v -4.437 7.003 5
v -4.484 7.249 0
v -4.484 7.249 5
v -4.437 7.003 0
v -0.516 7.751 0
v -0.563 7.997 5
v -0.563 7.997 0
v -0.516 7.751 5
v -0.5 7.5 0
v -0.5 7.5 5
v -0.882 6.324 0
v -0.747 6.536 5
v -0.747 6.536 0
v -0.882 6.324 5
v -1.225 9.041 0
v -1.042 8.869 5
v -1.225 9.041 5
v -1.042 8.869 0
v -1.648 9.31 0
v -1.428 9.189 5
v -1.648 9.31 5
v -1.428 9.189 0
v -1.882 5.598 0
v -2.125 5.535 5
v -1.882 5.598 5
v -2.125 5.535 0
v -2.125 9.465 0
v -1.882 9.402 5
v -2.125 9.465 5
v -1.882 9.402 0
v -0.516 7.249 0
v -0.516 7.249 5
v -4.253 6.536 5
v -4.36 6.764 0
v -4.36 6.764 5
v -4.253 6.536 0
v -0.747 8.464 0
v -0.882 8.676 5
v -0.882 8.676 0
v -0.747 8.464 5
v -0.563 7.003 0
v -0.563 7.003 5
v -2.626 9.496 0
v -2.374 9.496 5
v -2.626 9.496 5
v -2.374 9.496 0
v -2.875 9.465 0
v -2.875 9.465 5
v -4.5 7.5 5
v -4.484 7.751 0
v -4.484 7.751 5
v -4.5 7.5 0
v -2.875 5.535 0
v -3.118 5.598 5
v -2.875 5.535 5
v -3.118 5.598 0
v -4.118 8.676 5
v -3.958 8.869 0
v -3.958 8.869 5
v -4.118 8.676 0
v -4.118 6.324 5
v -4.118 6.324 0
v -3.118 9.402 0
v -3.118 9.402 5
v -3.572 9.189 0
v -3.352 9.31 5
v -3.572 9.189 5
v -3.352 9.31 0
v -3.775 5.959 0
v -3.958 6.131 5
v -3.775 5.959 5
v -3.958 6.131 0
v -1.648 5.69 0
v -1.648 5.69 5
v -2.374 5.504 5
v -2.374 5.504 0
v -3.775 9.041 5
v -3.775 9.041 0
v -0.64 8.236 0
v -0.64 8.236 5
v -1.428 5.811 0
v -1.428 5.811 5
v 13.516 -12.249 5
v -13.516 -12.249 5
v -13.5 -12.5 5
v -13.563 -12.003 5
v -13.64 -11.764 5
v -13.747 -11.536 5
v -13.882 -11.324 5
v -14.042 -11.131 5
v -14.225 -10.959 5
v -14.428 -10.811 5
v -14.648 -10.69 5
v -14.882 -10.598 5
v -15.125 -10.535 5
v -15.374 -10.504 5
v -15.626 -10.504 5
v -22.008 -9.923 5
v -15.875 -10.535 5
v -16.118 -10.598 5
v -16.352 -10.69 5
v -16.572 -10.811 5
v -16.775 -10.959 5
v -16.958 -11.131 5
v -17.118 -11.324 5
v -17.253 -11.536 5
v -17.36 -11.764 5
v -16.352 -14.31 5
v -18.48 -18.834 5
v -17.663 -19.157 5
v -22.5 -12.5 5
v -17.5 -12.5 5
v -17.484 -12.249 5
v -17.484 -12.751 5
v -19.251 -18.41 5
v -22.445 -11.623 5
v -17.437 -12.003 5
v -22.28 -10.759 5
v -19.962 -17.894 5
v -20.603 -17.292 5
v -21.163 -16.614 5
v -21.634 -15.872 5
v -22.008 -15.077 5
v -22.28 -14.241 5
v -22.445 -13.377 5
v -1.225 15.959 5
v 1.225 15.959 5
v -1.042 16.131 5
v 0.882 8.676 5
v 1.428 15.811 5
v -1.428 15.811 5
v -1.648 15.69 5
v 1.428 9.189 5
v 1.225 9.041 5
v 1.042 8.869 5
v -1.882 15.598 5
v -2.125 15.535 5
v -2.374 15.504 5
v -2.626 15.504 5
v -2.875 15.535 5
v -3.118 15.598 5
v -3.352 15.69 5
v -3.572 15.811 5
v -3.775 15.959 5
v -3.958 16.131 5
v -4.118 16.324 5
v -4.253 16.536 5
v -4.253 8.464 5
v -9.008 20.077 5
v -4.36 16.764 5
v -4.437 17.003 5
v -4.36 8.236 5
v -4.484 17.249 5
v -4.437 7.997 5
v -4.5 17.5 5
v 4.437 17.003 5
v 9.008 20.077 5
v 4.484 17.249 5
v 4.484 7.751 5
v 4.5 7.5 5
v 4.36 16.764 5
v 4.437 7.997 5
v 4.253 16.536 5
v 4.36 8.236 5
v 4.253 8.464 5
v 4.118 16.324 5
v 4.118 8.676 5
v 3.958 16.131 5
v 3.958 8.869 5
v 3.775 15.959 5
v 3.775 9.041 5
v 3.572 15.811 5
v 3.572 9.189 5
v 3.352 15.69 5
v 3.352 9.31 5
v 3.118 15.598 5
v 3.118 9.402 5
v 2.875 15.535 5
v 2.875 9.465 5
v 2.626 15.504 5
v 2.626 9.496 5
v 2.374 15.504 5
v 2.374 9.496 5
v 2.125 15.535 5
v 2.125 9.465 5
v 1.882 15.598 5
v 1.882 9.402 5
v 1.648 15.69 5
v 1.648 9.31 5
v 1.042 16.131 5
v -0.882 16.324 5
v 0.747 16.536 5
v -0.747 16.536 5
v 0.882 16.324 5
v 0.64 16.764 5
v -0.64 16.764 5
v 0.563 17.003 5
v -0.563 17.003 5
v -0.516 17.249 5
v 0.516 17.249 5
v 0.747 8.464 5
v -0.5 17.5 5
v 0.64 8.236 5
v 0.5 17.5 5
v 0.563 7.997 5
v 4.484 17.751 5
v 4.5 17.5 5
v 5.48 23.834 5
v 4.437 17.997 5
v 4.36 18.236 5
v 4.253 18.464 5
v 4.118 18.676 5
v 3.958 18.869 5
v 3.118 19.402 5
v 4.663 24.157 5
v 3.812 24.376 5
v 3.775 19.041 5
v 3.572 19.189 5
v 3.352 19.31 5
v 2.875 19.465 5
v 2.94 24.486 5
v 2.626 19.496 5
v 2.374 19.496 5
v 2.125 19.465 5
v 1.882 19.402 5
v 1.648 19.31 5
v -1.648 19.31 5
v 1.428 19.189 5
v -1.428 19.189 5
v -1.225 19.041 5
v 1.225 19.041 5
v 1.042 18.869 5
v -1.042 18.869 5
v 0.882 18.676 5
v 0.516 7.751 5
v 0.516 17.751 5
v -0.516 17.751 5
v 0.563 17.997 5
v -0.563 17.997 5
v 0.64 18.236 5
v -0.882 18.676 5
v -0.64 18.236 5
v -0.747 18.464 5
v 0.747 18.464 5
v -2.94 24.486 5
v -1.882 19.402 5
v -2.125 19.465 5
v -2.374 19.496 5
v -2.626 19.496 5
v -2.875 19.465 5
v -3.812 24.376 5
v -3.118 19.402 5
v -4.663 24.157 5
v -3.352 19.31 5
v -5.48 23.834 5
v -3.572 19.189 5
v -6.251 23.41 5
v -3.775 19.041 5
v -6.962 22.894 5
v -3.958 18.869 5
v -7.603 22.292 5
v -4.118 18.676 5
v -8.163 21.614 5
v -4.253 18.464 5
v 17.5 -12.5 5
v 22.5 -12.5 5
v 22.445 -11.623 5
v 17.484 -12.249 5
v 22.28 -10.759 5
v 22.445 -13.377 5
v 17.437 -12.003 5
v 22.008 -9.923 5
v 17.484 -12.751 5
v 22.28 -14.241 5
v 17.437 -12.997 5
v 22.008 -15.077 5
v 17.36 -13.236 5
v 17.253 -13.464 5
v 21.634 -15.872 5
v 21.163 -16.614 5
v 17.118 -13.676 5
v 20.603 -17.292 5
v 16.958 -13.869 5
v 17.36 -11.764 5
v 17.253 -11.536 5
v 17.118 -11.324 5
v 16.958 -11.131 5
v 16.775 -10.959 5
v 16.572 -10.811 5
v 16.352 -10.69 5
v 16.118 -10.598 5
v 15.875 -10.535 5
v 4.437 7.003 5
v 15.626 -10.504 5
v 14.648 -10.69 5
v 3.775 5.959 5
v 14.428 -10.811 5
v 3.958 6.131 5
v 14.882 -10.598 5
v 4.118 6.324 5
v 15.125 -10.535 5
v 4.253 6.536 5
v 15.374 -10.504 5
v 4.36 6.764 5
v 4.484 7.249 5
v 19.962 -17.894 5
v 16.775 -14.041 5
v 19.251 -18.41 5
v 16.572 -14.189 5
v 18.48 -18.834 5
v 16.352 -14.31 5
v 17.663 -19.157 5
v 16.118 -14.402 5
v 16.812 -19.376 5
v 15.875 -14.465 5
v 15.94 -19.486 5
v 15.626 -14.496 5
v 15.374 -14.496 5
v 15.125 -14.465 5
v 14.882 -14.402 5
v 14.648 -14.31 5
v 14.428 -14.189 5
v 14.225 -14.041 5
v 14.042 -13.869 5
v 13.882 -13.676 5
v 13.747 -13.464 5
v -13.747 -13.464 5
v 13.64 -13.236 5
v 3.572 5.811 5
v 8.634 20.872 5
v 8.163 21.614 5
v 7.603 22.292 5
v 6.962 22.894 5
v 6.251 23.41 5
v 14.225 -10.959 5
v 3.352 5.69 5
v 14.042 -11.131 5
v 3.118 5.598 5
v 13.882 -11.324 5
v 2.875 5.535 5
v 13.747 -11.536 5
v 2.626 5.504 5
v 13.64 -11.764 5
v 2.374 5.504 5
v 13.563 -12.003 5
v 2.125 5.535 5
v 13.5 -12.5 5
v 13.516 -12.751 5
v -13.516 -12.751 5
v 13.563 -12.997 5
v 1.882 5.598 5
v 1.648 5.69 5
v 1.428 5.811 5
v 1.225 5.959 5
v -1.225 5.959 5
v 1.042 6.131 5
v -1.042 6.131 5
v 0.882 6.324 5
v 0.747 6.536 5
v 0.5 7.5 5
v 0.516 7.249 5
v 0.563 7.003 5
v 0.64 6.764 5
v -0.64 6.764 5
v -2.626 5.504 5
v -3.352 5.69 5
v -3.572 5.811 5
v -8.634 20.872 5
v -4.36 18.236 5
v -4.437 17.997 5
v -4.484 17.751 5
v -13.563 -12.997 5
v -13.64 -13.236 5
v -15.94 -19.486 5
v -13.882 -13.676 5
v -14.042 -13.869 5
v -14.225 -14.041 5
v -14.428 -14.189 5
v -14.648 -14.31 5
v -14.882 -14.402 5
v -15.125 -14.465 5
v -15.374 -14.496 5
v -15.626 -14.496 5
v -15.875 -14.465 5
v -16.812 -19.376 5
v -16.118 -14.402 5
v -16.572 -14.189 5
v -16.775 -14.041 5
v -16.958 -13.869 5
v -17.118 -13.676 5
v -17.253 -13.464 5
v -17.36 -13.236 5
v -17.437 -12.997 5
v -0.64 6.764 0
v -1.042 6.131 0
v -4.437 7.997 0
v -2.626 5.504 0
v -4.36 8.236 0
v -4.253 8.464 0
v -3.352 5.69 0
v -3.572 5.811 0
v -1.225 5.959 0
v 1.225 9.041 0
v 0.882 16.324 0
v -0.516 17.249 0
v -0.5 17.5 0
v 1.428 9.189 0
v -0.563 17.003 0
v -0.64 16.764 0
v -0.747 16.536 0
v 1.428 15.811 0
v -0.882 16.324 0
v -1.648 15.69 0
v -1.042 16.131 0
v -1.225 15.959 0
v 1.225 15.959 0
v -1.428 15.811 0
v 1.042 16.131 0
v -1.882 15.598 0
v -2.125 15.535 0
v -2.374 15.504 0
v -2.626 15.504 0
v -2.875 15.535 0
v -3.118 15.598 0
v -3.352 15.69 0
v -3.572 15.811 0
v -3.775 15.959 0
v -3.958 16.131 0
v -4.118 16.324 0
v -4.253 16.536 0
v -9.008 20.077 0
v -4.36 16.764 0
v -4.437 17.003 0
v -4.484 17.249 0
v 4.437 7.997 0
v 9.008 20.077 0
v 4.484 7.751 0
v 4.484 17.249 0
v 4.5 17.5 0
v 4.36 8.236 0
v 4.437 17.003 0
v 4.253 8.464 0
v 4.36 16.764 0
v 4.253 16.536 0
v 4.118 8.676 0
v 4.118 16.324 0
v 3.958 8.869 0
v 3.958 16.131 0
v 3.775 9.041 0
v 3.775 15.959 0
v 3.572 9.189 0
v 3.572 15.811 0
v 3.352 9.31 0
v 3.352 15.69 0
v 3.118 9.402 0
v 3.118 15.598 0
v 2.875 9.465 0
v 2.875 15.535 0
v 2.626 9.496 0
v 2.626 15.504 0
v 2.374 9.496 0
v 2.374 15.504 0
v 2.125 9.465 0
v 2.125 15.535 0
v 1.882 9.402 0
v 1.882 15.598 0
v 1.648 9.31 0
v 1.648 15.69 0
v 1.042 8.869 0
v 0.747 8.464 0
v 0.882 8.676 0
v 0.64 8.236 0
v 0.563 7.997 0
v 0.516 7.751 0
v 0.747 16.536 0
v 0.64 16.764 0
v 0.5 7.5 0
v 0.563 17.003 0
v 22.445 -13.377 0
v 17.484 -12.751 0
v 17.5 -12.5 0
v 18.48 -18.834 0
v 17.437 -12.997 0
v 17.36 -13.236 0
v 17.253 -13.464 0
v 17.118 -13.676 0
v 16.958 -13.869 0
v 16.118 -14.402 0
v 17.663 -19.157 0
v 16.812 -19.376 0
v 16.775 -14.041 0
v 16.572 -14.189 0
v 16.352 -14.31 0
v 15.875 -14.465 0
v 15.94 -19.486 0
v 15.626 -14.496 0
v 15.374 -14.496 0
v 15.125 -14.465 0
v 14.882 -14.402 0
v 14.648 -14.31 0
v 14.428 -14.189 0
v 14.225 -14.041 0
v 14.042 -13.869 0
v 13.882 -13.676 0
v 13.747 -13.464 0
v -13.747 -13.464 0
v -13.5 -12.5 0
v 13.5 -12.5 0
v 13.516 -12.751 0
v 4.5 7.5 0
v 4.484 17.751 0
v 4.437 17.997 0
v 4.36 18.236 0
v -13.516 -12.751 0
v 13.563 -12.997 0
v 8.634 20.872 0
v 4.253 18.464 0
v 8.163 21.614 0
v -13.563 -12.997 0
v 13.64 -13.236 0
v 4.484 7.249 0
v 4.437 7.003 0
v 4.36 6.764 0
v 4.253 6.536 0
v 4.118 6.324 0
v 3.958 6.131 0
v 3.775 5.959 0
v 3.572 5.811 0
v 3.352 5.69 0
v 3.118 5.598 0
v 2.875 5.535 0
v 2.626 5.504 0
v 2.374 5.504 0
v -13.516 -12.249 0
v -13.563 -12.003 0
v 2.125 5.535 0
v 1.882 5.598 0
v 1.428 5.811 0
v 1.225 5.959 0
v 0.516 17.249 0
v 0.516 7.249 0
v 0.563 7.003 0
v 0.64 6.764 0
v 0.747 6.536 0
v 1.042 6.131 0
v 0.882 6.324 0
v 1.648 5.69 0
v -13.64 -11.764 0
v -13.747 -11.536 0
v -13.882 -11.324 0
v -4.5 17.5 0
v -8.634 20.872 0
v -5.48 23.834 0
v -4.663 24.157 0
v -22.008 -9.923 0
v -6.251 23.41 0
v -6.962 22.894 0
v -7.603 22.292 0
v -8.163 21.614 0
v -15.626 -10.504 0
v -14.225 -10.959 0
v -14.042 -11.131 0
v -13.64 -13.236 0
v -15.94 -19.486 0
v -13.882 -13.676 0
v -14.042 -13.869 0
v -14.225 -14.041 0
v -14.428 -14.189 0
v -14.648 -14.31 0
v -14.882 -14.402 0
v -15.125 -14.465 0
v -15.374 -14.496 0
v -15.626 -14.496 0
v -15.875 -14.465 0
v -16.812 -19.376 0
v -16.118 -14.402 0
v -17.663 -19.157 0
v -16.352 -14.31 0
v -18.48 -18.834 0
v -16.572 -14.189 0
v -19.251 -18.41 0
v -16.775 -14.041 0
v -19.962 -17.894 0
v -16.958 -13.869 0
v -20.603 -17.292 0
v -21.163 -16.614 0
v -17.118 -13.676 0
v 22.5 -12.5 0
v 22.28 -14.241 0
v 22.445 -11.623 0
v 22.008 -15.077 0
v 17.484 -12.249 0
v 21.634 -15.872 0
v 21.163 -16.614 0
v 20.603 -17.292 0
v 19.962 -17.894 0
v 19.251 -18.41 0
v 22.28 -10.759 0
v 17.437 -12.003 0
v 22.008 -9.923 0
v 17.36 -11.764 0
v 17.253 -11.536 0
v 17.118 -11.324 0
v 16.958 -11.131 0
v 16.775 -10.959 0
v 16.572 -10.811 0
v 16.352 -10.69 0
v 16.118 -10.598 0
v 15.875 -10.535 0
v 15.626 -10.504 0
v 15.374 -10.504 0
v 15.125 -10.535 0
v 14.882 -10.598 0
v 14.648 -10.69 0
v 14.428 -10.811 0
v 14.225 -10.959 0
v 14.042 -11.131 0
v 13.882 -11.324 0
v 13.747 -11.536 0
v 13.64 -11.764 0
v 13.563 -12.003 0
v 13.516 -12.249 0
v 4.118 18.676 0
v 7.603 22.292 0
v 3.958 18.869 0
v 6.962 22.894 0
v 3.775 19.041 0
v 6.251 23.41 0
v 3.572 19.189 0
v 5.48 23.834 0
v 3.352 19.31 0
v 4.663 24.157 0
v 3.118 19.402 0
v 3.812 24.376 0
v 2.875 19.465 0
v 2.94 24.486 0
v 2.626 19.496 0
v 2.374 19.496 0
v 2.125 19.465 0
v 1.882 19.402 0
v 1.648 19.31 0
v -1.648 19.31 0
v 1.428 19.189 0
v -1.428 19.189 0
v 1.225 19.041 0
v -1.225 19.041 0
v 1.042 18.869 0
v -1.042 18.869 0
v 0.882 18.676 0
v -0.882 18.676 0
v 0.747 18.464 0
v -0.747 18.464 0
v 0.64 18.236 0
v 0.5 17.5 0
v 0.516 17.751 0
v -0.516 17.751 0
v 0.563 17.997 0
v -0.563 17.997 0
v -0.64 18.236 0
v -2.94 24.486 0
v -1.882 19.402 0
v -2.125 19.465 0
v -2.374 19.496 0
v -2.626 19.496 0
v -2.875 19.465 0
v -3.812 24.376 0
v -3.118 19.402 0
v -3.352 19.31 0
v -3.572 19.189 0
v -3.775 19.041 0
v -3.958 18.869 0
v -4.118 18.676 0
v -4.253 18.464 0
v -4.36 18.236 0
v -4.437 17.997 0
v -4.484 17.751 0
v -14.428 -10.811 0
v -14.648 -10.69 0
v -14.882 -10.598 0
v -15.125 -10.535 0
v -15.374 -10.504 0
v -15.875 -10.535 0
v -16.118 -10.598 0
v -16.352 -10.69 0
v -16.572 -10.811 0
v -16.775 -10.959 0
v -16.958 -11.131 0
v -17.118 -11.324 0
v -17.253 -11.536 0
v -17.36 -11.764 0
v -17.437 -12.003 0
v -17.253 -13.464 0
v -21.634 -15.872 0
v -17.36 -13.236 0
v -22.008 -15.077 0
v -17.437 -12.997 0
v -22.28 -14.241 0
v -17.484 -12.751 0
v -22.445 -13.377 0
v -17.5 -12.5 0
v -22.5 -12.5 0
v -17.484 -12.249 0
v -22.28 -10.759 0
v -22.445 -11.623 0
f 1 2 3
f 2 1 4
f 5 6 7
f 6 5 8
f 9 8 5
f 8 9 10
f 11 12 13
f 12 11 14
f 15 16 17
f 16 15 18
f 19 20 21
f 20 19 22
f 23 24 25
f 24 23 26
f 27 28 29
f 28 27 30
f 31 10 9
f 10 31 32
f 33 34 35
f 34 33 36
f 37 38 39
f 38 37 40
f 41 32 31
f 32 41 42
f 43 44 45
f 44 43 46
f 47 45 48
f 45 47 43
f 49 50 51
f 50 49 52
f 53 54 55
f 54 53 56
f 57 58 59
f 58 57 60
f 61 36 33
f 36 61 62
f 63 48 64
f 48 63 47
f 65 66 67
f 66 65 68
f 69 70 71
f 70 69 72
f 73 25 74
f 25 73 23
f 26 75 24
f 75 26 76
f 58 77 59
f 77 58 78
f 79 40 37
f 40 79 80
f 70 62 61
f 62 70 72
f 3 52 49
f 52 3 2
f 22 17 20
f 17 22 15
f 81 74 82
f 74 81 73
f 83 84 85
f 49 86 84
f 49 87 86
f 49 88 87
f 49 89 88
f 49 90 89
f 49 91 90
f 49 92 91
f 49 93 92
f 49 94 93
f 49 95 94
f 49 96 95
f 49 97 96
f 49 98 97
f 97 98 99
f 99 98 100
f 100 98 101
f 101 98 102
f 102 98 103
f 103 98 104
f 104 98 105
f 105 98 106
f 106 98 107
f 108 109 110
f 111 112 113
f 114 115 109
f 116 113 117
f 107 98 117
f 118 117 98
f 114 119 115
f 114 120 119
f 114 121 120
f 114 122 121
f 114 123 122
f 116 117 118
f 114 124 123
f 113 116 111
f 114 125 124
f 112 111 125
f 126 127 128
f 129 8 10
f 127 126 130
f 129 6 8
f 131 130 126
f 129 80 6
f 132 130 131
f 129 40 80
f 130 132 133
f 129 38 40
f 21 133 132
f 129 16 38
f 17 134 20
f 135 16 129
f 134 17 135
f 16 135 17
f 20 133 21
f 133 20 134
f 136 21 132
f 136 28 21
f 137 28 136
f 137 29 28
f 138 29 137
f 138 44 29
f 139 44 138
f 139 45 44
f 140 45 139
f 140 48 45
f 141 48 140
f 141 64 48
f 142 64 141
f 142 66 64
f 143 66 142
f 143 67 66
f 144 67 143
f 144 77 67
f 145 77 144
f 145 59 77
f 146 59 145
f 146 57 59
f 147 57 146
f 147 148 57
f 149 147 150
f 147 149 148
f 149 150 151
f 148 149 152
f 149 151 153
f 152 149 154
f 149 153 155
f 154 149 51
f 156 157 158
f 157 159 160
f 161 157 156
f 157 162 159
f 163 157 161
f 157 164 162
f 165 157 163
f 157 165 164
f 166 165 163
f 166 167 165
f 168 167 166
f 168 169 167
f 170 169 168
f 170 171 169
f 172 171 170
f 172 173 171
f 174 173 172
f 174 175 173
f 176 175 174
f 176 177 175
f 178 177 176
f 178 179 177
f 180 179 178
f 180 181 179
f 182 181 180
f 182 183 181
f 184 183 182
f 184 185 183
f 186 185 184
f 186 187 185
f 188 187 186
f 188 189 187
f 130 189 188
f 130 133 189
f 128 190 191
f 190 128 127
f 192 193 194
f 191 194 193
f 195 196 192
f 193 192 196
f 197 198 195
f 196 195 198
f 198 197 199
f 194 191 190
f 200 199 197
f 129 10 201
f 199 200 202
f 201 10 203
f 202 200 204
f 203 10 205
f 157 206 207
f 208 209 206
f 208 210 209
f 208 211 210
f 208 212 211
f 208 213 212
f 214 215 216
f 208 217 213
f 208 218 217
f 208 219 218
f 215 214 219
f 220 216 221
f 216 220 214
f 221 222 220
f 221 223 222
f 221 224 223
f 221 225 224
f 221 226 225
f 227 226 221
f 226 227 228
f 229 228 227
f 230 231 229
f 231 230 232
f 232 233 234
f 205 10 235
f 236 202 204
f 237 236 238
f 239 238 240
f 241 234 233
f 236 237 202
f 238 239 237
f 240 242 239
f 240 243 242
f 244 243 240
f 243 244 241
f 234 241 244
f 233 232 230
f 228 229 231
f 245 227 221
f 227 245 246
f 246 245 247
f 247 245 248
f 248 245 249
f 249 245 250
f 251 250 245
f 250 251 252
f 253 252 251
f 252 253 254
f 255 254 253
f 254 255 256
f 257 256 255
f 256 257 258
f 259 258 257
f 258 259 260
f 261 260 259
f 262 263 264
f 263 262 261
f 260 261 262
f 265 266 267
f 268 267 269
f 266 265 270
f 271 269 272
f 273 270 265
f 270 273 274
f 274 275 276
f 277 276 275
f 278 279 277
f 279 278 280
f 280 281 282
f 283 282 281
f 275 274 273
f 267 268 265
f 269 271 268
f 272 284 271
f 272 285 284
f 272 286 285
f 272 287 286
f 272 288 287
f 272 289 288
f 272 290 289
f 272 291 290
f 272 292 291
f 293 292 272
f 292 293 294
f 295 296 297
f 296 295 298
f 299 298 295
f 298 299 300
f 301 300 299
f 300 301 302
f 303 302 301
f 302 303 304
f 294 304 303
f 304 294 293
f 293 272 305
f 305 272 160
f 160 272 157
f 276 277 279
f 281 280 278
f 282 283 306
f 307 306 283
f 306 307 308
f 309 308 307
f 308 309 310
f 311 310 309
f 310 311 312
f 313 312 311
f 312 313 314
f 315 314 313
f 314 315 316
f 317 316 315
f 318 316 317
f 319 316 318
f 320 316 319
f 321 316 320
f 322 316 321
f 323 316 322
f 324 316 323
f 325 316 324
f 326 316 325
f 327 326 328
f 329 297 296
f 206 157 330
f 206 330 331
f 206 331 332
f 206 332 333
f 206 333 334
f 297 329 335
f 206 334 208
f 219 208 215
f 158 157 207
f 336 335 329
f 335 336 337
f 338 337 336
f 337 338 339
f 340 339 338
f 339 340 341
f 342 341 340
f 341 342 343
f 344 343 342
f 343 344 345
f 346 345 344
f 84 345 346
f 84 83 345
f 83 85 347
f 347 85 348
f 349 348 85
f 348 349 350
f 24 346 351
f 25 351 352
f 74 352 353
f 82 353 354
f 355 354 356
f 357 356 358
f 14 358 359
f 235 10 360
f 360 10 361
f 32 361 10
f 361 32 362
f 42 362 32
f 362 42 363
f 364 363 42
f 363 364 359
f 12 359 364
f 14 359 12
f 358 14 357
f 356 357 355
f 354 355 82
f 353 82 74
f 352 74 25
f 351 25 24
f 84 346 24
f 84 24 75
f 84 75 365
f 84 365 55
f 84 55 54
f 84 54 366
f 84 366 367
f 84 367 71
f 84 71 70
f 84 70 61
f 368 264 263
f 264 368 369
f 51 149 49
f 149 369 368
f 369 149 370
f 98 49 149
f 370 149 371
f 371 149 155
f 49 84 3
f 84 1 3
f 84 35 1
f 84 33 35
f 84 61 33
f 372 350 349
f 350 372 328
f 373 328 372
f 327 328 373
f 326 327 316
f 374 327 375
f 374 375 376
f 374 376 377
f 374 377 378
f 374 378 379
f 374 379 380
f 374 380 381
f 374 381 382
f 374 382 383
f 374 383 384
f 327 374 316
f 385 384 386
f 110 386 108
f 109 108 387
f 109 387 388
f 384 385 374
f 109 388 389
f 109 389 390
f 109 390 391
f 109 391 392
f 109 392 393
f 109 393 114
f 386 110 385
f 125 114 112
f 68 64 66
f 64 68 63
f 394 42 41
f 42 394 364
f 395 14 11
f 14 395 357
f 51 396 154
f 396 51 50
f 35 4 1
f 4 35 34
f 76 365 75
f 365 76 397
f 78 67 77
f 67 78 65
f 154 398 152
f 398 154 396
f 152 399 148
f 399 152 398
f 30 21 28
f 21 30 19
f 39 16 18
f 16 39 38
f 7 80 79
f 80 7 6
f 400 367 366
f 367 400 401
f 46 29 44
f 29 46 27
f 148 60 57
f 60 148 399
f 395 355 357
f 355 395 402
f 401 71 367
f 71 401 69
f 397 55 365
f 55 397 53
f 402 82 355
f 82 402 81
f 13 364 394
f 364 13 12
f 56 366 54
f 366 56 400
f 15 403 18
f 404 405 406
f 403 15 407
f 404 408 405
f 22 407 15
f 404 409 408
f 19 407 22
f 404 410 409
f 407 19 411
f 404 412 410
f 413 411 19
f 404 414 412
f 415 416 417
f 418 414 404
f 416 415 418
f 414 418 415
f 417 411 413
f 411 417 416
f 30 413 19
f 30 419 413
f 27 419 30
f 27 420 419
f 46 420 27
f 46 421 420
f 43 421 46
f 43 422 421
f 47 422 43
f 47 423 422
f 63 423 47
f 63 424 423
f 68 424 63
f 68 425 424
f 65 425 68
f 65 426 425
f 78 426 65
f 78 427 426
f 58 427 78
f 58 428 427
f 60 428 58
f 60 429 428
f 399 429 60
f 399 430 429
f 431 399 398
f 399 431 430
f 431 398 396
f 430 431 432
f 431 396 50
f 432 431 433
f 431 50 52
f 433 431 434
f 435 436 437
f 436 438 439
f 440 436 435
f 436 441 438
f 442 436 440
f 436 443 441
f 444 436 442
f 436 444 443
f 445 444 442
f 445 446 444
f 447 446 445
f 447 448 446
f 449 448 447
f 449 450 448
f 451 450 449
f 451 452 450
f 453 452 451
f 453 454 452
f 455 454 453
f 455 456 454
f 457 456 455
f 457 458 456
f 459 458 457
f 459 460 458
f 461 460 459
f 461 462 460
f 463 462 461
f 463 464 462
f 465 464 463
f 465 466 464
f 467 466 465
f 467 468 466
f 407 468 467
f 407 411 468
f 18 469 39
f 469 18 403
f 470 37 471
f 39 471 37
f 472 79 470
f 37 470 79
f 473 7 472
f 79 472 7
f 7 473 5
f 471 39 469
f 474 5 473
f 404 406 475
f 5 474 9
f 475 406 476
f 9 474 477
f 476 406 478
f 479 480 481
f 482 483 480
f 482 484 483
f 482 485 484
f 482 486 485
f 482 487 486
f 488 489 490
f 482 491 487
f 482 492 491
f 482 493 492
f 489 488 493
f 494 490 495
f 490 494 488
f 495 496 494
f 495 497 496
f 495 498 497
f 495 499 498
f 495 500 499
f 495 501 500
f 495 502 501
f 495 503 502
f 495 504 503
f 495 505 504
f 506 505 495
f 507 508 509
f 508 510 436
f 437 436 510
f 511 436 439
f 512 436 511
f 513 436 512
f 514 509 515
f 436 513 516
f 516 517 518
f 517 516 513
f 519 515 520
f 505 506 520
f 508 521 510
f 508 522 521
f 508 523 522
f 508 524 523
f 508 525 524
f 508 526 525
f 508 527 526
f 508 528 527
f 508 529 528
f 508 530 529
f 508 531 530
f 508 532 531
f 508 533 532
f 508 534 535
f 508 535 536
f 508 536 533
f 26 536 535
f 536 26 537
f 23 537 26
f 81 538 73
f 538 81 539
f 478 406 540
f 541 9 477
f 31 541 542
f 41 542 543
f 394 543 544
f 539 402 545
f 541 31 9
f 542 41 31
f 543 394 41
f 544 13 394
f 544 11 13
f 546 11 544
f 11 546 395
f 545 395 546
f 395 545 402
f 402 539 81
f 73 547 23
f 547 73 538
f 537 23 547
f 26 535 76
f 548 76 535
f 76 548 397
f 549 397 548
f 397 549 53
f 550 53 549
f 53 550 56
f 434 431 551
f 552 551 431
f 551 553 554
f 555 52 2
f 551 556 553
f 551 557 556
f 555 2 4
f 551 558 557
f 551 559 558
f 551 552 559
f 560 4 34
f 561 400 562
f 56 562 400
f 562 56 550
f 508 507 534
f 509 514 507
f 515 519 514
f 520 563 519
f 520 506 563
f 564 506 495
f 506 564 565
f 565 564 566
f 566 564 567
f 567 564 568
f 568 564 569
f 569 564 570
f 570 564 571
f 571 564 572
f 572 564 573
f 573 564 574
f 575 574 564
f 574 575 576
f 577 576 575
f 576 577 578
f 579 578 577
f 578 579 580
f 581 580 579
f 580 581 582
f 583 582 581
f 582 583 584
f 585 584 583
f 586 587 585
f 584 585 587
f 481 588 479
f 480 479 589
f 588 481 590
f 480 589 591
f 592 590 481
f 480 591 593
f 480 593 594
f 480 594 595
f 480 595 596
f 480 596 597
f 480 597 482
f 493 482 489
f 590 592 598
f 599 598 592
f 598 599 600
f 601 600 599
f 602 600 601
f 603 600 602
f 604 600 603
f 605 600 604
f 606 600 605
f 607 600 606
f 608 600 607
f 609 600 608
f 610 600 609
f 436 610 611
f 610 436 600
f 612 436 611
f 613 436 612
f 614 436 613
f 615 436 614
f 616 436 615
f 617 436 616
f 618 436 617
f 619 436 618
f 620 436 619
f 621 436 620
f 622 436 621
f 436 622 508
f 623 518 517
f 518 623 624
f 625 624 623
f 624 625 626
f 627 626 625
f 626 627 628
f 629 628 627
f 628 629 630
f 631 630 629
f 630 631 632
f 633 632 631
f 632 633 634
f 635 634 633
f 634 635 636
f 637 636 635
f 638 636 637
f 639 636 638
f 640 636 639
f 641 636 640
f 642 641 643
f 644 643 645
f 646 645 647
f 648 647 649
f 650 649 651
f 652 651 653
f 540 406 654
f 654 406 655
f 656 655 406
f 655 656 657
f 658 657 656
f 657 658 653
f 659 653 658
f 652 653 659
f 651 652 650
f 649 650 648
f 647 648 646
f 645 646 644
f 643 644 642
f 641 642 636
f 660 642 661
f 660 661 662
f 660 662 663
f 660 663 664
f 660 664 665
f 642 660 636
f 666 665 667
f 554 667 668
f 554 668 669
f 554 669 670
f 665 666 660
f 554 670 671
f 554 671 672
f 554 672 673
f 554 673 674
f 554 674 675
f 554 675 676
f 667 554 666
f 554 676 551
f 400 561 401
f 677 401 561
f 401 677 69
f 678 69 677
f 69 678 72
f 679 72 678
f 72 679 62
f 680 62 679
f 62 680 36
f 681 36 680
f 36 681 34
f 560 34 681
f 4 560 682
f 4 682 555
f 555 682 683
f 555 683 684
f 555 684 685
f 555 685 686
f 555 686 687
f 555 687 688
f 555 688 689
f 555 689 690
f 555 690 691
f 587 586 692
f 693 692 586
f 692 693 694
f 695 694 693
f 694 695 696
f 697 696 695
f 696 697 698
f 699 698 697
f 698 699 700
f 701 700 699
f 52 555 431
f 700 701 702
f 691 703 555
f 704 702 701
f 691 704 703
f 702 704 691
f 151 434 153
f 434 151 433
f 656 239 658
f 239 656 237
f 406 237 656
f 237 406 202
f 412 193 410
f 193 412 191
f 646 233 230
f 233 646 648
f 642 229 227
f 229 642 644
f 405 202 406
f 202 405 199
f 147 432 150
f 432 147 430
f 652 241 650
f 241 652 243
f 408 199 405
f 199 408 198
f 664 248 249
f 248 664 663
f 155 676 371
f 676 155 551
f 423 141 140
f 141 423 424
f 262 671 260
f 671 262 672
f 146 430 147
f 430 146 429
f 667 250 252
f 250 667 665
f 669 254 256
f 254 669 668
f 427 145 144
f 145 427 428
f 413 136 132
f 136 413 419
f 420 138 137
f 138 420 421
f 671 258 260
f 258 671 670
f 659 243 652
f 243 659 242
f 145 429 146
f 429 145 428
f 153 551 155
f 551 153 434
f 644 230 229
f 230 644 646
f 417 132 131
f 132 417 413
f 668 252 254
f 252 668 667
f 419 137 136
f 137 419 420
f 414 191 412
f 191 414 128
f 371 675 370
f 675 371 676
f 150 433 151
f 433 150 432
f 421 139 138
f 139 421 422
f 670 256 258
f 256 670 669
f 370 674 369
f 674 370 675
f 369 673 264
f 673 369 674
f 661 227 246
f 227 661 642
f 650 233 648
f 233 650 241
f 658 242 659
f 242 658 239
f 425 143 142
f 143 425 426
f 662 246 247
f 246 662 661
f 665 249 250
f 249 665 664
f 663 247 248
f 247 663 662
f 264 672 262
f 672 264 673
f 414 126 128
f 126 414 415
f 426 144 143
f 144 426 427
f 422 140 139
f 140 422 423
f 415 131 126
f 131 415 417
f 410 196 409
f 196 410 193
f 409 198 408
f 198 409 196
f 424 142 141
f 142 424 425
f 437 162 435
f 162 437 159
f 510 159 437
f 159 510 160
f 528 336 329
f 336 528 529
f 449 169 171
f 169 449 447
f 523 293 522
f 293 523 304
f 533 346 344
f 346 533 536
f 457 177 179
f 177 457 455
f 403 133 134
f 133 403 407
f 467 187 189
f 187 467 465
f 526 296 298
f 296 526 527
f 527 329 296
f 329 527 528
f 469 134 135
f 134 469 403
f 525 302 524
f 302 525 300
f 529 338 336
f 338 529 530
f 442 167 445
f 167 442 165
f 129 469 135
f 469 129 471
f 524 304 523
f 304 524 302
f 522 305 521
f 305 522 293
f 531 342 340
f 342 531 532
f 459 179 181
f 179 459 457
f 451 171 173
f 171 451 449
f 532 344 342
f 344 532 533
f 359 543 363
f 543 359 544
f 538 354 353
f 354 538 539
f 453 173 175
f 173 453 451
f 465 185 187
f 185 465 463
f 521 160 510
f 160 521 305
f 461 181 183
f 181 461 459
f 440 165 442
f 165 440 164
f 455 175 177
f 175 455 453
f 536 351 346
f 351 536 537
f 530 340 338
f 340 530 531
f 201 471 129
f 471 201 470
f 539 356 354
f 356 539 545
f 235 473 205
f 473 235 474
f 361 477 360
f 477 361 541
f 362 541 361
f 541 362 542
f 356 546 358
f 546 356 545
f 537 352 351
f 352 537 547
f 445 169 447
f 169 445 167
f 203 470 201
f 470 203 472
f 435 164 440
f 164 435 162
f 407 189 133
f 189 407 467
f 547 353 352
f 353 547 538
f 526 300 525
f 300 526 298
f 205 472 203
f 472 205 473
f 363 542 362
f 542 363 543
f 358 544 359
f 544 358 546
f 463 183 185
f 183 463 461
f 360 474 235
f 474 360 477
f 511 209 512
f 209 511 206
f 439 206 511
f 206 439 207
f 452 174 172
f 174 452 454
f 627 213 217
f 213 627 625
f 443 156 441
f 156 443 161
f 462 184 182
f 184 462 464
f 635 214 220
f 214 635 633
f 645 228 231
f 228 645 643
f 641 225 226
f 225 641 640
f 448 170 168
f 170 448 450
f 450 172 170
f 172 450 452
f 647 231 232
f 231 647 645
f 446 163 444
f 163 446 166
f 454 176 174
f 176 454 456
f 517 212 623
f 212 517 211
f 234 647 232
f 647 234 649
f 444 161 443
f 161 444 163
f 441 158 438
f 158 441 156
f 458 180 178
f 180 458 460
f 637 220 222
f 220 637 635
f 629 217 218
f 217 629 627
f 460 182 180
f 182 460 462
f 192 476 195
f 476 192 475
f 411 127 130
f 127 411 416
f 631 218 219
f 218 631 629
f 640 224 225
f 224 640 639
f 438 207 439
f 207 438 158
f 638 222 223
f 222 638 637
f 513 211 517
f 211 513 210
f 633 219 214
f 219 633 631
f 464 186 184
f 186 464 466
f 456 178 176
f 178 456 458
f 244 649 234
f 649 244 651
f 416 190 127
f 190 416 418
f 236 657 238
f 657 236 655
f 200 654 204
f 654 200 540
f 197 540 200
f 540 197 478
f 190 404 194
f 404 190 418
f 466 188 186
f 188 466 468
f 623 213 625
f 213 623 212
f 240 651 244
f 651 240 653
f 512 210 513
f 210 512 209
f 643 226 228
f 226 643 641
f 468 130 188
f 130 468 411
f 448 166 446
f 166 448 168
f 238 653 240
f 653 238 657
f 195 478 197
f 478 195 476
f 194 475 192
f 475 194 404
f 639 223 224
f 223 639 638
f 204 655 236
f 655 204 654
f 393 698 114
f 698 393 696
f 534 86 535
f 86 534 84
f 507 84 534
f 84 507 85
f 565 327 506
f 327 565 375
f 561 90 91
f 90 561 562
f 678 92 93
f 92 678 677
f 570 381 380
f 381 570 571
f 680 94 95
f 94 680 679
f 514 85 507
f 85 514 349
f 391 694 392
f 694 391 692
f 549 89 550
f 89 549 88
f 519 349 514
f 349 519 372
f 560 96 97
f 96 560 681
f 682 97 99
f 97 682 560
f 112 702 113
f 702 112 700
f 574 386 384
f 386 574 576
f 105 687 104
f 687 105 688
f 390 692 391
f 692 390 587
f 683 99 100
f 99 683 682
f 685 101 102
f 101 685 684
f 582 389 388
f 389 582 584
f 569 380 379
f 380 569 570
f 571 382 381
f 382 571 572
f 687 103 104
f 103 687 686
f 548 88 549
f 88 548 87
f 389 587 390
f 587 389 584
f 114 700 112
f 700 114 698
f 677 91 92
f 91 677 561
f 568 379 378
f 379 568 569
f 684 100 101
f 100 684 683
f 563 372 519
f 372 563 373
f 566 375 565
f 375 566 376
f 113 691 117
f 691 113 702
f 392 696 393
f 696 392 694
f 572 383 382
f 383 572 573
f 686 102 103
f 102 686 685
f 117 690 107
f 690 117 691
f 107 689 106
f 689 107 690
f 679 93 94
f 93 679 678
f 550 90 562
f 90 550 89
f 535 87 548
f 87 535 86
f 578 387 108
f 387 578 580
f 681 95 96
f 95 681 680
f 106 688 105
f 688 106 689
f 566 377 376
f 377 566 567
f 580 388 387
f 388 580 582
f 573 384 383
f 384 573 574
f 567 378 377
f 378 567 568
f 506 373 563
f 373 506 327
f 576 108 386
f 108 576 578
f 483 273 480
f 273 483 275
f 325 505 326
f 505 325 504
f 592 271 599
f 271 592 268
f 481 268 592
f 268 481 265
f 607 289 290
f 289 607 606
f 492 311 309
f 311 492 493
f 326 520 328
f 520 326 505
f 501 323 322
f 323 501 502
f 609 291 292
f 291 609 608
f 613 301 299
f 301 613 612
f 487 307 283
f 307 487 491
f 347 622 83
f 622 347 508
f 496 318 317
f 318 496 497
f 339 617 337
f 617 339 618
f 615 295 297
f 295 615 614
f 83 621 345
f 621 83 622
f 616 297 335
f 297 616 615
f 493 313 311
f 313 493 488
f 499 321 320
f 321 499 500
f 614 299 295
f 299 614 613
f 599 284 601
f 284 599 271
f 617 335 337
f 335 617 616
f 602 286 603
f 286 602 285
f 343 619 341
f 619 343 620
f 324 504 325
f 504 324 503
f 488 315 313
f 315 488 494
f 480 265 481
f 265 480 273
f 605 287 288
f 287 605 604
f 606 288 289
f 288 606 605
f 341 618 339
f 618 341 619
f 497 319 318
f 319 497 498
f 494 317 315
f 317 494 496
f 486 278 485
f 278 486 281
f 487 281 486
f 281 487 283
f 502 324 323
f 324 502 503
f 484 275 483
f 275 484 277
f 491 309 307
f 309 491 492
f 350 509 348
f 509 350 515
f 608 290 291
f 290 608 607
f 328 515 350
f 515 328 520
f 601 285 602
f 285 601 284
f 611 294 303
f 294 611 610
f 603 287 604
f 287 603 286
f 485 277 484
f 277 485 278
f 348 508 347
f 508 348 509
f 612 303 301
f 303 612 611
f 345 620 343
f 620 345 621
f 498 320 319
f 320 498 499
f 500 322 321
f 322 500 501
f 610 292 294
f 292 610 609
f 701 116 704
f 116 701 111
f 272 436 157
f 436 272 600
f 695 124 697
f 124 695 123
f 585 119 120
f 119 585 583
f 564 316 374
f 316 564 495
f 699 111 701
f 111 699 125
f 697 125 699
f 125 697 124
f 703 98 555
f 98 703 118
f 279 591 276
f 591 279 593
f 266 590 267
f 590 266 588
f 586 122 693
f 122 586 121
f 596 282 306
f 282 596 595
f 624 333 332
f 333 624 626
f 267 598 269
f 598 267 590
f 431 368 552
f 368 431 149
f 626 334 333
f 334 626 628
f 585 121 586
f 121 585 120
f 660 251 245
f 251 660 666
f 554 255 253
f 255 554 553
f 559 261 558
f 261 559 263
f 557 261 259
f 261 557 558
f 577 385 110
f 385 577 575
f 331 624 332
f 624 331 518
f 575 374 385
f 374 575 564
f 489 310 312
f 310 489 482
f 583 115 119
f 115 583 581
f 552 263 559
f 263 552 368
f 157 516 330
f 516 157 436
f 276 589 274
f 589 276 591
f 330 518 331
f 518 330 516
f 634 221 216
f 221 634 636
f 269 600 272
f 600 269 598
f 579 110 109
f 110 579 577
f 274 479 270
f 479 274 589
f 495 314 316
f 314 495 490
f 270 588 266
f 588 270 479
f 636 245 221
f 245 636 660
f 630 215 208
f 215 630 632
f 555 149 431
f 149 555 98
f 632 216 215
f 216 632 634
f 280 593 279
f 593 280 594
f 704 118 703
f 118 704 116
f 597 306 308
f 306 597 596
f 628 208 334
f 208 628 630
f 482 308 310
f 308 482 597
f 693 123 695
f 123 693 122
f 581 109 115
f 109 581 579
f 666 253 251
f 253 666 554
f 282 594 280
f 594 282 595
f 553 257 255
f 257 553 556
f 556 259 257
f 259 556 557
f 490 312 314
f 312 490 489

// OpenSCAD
THICKNESS = 5;

BELT_MOUNT_HOLE_SPACING_X = 5; // 10; // 10;
BELT_MOUNT_HOLE_SPACING_Y = 10; // 5; // 5;
BELT_MOUNT_HOLE_DIA = 4;

FRAME_MOUNT_HOLE_SPACING_X = 31; // 0; // 36;
FRAME_MOUNT_HOLE_SPACING_Y = 0; // 20; // 0;
FRAME_MOUNT_HOLE_DIA = 4; // 4; // 5;

MOUNT_SPACING = 25; // 30; // 25;

$fn = 50;

module mount_holes(dia, spacing_x, spacing_y) {
    for(i = [-1, 1]) {
        for(j = [-1, 1]) {
            translate([i * spacing_x/2, j * spacing_y/2, 0])
            cylinder(d = dia, h = THICKNESS);            
        }
    }
}

difference() {
    hull() {
        translate([0, MOUNT_SPACING/2, 0])
        mount_holes(BELT_MOUNT_HOLE_DIA + 2 * THICKNESS, BELT_MOUNT_HOLE_SPACING_X, BELT_MOUNT_HOLE_SPACING_Y);
        translate([0, -MOUNT_SPACING/2, 0])
        mount_holes(FRAME_MOUNT_HOLE_DIA + 2 * THICKNESS, FRAME_MOUNT_HOLE_SPACING_X, FRAME_MOUNT_HOLE_SPACING_Y);
    }
    translate([0, MOUNT_SPACING/2, 0])
    mount_holes(BELT_MOUNT_HOLE_DIA, BELT_MOUNT_HOLE_SPACING_X, BELT_MOUNT_HOLE_SPACING_Y);
    translate([0, -MOUNT_SPACING/2, 0])
    mount_holes(FRAME_MOUNT_HOLE_DIA, FRAME_MOUNT_HOLE_SPACING_X, FRAME_MOUNT_HOLE_SPACING_Y);
}
